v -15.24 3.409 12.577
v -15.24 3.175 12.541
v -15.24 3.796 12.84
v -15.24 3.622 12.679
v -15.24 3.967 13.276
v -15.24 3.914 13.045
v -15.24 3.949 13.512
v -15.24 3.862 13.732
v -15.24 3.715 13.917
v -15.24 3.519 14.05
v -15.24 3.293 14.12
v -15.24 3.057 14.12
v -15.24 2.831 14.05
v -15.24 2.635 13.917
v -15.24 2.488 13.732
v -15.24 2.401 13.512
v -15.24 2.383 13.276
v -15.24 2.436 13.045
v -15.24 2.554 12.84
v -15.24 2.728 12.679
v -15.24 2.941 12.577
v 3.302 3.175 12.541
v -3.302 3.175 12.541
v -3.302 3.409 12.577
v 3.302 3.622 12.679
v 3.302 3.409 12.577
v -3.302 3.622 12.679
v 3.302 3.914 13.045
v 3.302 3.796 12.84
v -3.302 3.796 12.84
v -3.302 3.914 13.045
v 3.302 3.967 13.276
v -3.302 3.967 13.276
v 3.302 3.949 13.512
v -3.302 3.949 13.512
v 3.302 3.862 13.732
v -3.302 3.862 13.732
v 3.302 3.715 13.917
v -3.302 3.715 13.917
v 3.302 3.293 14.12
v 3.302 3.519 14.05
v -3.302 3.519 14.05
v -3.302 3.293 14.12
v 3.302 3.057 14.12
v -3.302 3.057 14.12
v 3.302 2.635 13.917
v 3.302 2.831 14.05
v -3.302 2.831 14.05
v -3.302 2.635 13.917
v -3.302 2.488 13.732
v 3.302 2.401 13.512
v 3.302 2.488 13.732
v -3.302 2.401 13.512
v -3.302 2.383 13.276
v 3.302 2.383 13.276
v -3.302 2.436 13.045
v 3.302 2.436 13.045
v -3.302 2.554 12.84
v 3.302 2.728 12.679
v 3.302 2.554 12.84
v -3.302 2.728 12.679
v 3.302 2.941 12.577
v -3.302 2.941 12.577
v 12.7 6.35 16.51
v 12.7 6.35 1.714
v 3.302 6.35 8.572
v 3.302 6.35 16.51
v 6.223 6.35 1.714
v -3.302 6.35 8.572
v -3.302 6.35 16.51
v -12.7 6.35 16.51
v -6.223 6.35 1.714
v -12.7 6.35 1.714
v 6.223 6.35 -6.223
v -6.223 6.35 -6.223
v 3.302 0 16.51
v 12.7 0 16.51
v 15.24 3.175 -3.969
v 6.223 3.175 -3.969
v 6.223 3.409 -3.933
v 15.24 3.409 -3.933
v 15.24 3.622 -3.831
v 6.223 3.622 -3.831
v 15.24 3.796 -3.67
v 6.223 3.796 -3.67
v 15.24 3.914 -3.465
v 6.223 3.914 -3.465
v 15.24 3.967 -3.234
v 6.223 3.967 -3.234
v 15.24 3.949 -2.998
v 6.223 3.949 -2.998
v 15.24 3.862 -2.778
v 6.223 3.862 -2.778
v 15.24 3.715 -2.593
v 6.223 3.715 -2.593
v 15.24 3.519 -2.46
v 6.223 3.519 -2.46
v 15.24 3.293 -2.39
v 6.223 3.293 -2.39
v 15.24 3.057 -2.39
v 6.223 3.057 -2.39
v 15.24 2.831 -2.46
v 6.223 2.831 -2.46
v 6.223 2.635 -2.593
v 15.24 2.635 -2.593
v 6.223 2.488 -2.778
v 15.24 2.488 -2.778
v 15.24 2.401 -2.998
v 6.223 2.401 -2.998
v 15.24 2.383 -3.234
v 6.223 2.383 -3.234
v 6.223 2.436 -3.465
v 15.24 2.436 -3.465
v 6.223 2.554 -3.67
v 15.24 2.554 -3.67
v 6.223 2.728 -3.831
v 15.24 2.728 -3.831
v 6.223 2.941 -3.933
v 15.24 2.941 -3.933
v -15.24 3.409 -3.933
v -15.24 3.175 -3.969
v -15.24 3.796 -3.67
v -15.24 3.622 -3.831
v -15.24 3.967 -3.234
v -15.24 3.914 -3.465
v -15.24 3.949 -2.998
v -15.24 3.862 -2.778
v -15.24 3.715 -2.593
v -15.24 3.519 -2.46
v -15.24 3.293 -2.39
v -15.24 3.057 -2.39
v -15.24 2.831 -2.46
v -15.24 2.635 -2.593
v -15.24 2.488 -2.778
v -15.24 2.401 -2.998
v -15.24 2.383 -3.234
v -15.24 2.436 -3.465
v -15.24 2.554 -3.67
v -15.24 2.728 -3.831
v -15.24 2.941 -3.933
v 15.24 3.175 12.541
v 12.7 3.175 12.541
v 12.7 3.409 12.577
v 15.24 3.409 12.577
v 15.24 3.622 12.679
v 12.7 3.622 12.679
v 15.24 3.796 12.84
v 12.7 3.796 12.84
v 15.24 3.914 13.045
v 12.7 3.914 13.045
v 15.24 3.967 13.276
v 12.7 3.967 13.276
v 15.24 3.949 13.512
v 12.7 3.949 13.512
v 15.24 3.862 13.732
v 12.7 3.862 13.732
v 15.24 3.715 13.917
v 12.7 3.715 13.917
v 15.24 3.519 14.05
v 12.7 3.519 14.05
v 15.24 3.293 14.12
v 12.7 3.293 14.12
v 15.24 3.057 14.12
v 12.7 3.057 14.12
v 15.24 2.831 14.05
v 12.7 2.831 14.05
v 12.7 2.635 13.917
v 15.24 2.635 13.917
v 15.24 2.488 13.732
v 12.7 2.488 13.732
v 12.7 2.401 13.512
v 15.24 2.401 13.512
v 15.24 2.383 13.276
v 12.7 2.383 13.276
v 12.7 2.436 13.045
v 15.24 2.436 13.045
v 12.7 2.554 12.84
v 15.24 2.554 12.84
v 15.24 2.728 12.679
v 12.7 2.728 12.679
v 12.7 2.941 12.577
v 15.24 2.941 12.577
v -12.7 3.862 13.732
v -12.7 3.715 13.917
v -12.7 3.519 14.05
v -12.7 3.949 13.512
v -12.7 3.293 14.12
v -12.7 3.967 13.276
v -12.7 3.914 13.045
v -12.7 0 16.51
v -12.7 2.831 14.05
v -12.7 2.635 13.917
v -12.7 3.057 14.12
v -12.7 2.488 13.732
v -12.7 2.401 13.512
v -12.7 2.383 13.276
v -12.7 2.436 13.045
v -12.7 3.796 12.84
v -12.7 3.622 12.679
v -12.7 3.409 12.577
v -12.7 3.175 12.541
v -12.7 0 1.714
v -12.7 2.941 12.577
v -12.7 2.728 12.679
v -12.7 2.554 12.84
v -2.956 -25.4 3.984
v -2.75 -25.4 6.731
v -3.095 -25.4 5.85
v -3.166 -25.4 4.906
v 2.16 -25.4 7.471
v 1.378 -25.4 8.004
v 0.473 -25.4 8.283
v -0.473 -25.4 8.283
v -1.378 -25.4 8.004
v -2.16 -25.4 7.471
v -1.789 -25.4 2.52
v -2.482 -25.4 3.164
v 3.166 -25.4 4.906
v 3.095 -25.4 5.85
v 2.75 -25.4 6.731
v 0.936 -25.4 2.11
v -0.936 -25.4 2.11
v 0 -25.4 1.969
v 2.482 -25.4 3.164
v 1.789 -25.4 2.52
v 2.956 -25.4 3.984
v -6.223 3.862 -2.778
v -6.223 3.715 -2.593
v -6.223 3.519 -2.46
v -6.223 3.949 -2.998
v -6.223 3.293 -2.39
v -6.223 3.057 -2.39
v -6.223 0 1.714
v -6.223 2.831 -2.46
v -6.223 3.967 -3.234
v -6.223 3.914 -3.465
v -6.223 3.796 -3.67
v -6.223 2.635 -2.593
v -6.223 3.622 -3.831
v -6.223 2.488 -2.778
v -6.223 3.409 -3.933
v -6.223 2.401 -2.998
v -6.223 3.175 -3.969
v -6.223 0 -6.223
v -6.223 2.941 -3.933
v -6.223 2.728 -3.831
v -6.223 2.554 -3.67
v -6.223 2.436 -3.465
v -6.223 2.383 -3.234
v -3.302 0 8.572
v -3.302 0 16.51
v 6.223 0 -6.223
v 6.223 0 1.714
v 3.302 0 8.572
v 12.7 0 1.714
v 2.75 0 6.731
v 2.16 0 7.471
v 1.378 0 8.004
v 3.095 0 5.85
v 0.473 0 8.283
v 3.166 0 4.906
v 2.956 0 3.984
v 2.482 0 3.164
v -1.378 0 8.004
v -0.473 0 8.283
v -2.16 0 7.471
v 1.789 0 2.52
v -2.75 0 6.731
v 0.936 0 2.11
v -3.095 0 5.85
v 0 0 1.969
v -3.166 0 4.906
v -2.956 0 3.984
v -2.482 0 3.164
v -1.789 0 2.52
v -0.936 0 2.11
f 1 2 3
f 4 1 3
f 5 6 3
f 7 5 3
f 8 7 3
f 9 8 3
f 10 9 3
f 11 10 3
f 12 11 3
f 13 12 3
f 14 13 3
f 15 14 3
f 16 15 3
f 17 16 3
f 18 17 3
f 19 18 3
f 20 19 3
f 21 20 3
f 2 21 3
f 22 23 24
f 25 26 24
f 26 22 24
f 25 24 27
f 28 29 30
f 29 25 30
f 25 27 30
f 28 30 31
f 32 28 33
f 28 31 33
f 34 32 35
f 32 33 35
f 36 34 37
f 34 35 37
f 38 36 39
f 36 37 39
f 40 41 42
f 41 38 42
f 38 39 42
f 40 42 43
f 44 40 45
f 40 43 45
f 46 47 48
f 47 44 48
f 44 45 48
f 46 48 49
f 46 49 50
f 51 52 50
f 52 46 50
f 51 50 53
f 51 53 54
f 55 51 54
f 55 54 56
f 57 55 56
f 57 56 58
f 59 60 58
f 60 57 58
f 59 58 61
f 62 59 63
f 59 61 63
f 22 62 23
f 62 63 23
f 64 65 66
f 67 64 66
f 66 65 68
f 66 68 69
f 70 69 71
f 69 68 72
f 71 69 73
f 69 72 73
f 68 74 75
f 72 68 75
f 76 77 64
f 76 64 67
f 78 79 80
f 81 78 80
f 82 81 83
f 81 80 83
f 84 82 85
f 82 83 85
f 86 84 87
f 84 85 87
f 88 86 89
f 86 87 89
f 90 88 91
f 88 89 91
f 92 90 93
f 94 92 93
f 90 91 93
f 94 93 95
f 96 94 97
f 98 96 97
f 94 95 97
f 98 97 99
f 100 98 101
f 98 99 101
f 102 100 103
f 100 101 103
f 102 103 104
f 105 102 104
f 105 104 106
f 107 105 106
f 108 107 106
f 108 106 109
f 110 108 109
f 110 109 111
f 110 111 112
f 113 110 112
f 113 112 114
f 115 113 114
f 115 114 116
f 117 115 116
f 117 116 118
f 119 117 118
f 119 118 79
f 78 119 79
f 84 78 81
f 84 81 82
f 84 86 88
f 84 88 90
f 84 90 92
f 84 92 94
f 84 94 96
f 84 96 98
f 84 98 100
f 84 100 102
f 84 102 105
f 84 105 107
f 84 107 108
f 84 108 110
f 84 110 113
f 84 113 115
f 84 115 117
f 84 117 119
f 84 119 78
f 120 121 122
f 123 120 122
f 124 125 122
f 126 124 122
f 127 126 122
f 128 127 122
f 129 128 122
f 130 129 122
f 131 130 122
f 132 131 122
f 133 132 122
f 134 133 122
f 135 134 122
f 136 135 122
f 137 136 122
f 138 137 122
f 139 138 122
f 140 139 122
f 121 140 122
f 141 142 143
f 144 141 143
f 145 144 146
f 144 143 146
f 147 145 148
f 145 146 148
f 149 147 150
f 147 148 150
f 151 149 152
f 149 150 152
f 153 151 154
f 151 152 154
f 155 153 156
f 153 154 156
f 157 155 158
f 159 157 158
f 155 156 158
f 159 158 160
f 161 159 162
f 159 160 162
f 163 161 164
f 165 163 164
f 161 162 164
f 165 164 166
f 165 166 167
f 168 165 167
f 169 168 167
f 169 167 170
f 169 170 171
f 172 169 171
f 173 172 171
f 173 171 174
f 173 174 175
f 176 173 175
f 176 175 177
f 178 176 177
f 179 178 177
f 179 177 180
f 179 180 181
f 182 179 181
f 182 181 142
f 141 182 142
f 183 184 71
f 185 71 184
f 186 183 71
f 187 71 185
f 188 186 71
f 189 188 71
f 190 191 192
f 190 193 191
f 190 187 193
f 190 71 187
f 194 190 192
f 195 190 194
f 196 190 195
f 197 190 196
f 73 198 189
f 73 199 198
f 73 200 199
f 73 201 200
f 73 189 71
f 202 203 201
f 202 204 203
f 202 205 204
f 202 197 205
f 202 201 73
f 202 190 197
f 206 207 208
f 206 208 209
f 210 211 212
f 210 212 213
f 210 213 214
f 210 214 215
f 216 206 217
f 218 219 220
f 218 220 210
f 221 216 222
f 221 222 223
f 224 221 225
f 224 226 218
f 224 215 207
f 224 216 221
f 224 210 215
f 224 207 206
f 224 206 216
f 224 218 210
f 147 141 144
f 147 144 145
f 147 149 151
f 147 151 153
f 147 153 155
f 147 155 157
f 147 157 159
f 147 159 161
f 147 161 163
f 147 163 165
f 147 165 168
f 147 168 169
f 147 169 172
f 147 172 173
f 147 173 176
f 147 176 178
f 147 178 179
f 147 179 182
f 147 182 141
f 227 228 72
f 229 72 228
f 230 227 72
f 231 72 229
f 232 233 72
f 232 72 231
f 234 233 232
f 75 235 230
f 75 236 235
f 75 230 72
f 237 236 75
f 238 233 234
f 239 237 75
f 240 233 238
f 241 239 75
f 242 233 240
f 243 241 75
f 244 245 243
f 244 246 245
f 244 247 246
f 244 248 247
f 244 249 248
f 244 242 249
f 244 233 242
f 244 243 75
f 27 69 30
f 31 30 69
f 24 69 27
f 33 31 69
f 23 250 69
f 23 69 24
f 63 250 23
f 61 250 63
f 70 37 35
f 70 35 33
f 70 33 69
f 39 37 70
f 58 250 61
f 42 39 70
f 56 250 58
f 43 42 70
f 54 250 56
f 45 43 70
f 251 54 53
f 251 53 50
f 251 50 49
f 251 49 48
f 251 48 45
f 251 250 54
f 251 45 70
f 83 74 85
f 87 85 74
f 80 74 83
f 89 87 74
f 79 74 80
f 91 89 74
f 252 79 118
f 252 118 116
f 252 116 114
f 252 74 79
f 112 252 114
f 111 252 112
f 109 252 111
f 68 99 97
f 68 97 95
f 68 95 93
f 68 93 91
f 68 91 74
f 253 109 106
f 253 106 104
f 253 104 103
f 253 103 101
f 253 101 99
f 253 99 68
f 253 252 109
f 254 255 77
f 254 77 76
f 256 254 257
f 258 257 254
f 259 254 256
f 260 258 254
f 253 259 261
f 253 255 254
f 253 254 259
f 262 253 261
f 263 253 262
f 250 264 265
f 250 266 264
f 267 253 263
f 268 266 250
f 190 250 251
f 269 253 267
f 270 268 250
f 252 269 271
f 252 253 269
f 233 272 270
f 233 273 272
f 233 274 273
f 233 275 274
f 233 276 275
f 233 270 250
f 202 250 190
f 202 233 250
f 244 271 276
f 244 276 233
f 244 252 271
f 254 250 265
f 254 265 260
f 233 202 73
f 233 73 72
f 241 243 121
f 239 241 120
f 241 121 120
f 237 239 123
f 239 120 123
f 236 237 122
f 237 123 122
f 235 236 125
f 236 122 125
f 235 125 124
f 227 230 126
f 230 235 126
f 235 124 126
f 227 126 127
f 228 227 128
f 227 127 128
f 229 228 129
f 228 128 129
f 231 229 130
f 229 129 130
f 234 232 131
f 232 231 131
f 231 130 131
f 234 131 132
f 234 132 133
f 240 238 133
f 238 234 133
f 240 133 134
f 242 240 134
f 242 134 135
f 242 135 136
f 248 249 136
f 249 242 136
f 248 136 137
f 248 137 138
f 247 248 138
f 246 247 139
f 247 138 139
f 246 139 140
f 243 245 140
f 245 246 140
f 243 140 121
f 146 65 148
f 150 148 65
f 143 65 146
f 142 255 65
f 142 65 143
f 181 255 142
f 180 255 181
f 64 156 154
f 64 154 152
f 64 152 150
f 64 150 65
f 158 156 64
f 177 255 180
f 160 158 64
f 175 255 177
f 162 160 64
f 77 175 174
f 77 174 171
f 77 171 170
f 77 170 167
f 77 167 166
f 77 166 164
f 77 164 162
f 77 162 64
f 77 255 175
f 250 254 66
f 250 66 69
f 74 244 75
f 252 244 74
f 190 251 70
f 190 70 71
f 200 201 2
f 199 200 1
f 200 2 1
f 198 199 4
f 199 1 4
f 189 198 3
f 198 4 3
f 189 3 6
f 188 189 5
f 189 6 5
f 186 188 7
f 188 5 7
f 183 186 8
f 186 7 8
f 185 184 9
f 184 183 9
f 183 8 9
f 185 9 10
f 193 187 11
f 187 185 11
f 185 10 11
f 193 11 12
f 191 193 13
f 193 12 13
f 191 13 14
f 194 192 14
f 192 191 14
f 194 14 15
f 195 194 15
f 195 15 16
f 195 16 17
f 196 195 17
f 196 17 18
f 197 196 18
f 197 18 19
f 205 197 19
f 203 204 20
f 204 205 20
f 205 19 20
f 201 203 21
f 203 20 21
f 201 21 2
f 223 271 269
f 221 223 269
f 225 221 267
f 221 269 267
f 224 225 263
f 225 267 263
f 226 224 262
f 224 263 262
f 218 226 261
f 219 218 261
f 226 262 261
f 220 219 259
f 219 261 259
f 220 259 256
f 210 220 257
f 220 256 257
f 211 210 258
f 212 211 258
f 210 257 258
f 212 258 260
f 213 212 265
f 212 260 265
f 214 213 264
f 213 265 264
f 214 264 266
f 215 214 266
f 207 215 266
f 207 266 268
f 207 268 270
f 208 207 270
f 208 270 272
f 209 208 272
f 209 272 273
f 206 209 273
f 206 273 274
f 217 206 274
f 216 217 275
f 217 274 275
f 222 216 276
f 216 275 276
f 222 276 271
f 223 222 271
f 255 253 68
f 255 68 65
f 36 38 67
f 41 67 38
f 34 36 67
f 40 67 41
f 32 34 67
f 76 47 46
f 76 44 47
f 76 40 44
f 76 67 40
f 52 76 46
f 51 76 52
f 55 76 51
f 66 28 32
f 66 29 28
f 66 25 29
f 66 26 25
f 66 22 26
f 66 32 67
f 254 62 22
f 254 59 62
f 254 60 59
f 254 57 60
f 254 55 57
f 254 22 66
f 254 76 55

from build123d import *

# Parameters (mm, degrees)
FINGERBASE_DEPTH         = 6.35
BOSS_EXTRUDE1_DEPTH      = 2.54
BOSS_EXTRUDE1_DEPTH_BACK = 27.94
SKETCH2_R                = 0.79375
SKETCH3_R                = 3.175
BOSS_EXTRUDE2_DEPTH      = 25.4


with BuildPart() as part:
    # Sketch1 → FingerBase (new body)
    with BuildSketch(Plane(origin=(0, 0, 0), x_dir=(1, 0, 0), z_dir=(0, 1, 0))):
        Polygon((-6.223, 6.223), (6.223, 6.223), (6.223, -1.7145), (12.7, -1.7145), (12.7, -16.51), (3.302, -16.51), (3.302, -8.5725), (-3.302, -8.5725), (-3.302, -16.51), (-12.7, -16.51), (-12.7, -1.7145), (-6.223, -1.7145), align=None)
    extrude(amount=FINGERBASE_DEPTH)

    # Sketch2 → Boss-Extrude1 (add, two sides: drawn at the far end of the back side and taken through both)
    with BuildSketch(Plane(origin=(12.7, 0, 0), x_dir=(0, 0, -1), z_dir=(1, 0, 0)).offset(-BOSS_EXTRUDE1_DEPTH_BACK)):
        with Locations((-13.335, 3.175)):
            Circle(SKETCH2_R)
        with Locations((3.175, 3.175)):
            Circle(SKETCH2_R)
    extrude(amount=BOSS_EXTRUDE1_DEPTH + BOSS_EXTRUDE1_DEPTH_BACK)

    # Sketch3 → Boss-Extrude2 (add)
    with BuildSketch(Plane.XZ):
        with Locations(Location((0, 5.1435, 0), (0, 0, 270))):
            Circle(SKETCH3_R)
    extrude(amount=BOSS_EXTRUDE2_DEPTH)


solid = part.part
